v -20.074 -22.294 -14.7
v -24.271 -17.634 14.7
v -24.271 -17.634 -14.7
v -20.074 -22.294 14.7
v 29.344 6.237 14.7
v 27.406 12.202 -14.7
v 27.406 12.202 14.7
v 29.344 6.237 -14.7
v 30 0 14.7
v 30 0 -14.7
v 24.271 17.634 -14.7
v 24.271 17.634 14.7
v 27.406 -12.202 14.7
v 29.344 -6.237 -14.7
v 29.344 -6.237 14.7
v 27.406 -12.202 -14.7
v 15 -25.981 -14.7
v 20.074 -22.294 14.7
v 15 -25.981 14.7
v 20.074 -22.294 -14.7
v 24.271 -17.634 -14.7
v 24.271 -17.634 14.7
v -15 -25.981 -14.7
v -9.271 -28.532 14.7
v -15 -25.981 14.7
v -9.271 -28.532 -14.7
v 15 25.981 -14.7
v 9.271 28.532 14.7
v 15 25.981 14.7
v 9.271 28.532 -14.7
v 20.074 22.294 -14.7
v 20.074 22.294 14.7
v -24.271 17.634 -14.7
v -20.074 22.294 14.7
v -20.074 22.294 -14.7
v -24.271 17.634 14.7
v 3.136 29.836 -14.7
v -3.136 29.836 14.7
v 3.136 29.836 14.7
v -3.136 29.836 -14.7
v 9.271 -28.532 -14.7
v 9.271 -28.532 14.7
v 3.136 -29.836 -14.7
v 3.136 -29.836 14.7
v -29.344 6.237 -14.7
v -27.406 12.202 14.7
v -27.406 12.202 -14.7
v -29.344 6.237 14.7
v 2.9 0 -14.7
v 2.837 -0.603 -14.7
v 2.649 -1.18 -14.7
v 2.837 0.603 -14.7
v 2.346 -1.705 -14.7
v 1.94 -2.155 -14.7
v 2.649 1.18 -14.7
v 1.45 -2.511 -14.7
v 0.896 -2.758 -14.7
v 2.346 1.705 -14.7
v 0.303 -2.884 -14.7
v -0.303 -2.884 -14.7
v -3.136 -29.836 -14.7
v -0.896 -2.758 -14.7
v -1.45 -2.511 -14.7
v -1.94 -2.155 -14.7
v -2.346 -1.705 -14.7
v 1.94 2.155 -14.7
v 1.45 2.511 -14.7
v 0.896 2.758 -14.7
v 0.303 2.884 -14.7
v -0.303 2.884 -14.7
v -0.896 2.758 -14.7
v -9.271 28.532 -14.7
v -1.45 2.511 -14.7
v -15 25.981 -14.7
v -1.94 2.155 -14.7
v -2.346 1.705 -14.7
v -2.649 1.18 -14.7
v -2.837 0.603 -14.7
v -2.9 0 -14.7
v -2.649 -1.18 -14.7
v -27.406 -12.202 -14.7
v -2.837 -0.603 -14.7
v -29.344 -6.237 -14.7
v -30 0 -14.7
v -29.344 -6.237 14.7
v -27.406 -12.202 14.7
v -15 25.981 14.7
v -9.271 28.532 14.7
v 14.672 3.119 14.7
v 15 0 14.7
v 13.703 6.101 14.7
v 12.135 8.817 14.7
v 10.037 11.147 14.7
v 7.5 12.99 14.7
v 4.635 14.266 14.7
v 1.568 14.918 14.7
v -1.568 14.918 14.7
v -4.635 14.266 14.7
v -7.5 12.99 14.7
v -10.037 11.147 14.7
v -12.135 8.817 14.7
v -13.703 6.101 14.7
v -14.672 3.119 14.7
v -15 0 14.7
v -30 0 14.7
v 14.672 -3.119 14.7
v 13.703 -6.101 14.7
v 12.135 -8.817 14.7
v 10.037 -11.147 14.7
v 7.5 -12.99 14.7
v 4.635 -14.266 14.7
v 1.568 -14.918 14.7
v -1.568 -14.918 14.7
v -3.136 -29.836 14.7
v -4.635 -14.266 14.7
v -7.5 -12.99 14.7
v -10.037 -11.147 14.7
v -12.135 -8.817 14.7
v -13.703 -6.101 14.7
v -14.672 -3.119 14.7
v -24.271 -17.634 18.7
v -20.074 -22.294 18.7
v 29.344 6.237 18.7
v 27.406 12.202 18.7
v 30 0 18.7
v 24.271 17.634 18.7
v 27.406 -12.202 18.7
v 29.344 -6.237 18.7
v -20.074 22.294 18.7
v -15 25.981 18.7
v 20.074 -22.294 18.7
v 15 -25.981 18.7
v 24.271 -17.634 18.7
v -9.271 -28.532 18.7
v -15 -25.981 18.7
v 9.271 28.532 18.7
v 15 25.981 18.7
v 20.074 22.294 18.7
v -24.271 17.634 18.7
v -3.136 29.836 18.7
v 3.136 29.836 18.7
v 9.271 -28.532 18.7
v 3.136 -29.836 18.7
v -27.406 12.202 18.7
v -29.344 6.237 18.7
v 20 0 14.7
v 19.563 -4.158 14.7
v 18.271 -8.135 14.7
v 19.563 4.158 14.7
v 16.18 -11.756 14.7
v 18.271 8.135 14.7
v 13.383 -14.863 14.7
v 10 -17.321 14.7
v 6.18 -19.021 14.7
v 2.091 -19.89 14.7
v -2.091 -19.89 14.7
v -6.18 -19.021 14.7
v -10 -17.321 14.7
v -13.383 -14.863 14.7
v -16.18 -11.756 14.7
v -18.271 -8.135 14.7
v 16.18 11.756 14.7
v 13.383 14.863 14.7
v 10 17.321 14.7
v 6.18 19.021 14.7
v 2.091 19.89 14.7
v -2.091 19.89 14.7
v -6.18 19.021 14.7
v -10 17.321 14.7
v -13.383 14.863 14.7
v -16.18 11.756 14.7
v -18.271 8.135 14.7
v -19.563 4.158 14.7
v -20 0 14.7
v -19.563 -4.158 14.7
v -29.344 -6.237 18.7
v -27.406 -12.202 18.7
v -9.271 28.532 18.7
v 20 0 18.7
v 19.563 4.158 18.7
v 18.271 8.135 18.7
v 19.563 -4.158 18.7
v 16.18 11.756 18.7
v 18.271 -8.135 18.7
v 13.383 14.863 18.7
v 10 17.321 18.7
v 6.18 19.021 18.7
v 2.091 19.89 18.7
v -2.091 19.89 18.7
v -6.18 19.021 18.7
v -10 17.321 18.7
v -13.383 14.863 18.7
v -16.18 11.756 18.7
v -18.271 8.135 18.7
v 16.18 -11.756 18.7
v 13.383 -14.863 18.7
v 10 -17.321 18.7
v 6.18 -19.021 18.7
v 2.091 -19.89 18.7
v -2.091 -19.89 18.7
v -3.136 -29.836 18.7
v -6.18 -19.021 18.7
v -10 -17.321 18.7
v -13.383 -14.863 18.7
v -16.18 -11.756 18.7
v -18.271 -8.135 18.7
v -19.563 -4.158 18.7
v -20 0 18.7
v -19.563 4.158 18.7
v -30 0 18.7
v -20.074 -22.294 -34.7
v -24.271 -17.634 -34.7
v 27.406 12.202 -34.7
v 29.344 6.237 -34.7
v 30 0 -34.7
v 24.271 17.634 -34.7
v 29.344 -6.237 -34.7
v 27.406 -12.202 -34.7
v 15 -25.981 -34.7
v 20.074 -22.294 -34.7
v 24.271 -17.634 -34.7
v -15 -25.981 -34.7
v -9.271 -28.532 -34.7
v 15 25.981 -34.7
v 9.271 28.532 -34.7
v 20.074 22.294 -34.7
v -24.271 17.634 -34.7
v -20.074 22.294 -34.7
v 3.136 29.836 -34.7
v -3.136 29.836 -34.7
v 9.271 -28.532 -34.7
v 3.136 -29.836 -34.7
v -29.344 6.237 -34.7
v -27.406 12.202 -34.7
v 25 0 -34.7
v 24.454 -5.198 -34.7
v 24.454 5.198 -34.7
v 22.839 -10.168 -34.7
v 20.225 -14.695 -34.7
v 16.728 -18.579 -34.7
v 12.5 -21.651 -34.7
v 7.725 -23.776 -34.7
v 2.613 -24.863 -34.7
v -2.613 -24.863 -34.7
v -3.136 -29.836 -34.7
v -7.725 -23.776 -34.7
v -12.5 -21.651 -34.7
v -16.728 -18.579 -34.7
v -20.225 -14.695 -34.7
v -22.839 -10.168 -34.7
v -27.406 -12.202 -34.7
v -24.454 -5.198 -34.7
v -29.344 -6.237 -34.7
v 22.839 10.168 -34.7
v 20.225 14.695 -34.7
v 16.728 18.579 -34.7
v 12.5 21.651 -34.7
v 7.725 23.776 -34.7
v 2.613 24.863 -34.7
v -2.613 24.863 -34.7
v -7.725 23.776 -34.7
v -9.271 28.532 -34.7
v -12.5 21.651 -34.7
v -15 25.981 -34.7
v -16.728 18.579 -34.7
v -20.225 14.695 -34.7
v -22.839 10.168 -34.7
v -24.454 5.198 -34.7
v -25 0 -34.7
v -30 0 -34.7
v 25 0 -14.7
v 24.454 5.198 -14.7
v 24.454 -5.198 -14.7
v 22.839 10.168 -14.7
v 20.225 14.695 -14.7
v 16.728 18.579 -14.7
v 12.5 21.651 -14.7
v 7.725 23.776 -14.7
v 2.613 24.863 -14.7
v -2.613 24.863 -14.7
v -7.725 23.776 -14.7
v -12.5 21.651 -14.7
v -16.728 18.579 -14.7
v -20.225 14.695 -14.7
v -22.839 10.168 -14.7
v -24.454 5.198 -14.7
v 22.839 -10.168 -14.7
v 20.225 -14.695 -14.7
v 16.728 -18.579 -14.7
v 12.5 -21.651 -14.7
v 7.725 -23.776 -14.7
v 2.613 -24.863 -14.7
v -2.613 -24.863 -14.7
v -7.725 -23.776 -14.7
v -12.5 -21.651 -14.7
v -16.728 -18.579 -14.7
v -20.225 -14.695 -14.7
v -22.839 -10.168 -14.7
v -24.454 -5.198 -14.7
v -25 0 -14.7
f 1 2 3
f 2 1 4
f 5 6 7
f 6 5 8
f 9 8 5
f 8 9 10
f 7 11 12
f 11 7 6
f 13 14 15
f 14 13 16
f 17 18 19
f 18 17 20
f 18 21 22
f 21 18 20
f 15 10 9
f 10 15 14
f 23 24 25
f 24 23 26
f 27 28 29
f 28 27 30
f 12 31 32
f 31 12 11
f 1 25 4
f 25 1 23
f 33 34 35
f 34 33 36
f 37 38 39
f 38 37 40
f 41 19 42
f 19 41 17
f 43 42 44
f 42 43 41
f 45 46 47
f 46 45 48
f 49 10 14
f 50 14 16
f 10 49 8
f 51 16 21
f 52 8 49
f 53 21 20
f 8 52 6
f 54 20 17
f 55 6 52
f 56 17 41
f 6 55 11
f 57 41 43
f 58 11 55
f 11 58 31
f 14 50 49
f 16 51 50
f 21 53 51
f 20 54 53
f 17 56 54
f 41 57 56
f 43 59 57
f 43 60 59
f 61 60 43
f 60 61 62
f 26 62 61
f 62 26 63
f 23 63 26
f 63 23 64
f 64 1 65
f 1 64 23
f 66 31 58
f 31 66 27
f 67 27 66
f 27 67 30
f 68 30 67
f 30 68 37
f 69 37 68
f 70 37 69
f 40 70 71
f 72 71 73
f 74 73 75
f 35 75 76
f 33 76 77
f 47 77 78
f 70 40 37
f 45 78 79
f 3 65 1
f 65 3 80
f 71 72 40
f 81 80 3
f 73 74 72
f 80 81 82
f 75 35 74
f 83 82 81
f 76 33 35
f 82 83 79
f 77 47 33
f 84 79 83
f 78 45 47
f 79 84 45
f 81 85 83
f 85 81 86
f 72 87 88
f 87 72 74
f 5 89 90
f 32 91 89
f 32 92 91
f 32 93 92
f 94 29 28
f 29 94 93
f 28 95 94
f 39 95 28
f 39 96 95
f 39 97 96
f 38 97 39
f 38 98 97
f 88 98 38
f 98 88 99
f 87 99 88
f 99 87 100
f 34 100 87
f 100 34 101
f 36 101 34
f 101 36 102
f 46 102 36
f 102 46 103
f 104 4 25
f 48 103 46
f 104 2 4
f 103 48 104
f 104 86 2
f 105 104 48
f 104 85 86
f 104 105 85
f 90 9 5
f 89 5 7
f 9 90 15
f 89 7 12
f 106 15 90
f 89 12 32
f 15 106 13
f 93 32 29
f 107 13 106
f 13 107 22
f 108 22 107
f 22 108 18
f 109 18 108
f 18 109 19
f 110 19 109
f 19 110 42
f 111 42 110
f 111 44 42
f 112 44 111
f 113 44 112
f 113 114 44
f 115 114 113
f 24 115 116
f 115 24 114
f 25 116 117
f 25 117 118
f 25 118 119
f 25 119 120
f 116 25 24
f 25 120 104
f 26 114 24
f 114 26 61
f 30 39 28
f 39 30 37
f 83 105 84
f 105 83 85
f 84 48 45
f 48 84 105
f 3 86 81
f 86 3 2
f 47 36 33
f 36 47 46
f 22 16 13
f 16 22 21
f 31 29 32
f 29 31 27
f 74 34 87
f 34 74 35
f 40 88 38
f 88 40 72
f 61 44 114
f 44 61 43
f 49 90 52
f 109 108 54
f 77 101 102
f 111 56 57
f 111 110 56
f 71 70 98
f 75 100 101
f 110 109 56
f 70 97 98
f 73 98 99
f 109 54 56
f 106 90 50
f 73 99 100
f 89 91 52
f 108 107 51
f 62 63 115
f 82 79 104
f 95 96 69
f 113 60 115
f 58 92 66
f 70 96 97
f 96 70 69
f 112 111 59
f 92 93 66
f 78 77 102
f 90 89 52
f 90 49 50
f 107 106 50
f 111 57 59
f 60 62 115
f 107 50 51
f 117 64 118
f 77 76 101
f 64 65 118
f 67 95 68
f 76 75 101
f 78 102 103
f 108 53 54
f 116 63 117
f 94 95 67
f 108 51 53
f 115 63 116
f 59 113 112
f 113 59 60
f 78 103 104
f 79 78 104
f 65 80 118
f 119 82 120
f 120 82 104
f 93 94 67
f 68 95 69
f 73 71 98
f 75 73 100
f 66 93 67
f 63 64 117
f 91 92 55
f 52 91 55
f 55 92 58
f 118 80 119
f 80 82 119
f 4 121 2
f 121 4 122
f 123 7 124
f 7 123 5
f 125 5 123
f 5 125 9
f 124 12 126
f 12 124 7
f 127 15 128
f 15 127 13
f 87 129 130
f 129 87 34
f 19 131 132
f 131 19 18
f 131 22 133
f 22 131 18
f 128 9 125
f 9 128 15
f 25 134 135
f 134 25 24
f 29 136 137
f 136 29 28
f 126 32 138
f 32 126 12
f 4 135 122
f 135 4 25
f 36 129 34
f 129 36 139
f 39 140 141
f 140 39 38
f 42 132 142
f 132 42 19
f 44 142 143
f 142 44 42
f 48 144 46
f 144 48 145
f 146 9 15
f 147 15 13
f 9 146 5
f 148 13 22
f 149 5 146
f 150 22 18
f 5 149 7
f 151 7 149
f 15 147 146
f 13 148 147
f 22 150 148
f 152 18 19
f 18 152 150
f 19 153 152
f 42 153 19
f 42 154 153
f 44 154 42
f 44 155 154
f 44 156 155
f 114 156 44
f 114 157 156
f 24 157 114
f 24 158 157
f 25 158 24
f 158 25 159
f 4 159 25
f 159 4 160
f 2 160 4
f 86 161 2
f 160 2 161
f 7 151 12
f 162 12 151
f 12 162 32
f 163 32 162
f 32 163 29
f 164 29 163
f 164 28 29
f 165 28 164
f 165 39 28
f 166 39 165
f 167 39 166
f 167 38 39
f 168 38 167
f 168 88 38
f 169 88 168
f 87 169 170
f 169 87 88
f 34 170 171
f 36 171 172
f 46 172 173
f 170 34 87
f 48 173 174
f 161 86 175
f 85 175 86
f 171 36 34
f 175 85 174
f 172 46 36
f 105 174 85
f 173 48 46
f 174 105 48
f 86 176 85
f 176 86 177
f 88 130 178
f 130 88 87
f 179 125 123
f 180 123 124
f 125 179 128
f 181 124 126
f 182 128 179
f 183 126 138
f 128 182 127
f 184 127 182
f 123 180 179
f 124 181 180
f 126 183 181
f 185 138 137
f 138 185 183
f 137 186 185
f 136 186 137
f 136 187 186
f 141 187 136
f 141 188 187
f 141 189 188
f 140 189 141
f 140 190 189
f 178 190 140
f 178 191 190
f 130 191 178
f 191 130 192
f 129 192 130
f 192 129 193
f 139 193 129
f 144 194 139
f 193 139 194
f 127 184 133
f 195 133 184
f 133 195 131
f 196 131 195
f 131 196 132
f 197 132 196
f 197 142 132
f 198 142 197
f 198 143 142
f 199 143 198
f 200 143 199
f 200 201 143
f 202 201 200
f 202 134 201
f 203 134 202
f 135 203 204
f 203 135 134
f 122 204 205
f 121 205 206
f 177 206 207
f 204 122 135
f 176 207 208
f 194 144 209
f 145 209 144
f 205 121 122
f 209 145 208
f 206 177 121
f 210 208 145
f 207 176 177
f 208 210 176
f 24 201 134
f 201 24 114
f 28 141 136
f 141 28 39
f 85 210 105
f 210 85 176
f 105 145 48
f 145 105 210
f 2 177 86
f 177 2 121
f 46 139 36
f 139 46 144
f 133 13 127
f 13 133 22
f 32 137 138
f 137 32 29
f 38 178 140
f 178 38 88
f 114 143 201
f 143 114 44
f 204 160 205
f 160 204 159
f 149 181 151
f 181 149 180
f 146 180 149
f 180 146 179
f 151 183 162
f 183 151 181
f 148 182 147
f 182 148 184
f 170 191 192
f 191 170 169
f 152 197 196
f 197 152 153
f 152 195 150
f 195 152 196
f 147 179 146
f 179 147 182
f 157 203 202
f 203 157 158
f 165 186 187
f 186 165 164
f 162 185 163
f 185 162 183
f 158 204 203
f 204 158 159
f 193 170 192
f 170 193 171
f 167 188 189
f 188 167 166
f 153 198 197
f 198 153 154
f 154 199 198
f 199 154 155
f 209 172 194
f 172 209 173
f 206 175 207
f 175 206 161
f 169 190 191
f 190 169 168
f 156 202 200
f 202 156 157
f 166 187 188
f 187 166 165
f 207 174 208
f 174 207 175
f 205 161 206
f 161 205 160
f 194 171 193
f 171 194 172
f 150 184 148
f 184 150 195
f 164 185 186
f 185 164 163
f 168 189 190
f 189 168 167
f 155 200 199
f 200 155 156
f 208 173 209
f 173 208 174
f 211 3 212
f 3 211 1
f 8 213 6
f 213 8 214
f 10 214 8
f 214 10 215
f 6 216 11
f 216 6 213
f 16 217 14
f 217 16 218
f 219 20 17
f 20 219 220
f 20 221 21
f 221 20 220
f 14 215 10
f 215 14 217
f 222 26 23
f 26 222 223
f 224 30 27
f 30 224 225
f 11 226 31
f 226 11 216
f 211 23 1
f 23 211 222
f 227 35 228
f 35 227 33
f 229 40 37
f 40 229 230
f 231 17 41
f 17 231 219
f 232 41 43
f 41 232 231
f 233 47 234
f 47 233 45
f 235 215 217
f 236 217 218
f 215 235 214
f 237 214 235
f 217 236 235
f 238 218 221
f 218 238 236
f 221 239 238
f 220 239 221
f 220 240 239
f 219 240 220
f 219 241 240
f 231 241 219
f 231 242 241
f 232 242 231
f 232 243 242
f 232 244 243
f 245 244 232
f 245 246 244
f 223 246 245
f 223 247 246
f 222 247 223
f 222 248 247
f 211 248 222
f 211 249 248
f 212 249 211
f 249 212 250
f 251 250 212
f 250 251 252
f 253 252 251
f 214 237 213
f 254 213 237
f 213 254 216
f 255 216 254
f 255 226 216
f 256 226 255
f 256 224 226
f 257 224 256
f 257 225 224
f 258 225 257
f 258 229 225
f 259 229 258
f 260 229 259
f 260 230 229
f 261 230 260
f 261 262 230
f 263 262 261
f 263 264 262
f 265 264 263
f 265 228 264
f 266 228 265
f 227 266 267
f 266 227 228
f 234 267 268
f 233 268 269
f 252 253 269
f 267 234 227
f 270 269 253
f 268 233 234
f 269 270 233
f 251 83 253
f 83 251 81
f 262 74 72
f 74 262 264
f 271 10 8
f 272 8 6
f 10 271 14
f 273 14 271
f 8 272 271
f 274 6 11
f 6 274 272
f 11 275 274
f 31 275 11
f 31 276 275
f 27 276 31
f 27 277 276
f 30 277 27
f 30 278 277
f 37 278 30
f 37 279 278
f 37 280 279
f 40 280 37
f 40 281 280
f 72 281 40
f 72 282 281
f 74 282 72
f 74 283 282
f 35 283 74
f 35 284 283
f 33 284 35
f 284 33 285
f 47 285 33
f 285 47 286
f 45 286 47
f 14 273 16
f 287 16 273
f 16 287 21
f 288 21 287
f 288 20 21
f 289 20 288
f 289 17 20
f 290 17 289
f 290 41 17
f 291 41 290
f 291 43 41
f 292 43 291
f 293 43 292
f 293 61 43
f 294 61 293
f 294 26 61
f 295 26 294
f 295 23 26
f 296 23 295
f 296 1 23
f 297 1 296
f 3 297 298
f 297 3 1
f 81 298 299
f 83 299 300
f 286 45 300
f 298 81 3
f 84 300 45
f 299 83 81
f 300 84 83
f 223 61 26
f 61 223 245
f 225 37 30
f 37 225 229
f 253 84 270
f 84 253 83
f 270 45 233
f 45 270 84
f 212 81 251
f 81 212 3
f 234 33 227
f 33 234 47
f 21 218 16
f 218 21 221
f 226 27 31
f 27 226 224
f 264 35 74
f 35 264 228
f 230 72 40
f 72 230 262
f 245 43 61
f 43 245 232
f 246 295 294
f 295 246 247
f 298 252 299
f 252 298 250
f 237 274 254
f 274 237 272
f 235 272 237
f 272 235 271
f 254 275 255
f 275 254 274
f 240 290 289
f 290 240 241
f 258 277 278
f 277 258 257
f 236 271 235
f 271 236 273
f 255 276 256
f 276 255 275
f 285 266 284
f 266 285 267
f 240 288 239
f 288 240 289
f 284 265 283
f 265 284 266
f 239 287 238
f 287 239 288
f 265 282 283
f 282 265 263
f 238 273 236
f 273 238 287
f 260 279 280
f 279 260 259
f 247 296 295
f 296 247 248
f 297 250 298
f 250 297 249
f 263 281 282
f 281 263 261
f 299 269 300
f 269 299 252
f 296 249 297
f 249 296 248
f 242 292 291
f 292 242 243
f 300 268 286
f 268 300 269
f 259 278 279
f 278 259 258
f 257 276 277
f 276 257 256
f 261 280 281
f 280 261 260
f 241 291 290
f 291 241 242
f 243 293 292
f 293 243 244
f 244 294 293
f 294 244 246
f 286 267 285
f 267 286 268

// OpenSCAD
//The lense diameter in mm, not HALF
lensediameter = 30;
//The led diameter in mm, not HALF
leddiameter = 5.8;
//The focus in mm
focus = 25;
//The tubediameter in mm
tubediameter = 30;
//The lense height
lenseheight = 4;
//Edge to bet generated AROUND the lense, because sometimes you have to adjust the lense.
lenseedge = 5;
//This is the amount of mm increased to the focus, because the led do not emit light at Z=0, the TSAL6100 in this case @ 4.4mm, please look in the datasheet of the TSAL6100 emitter to know what i mean
ledmmstartradiation = 4.4; //4.4 if you use a TSAL6100

//Make extrapipe* ZERO do deactivate it. This adds a extra pipe to the main cylinder.
extrapipe = 20;
extrapipe_innerdiameter = 5;



height = focus + ledmmstartradiation;


difference() {

cylinder(h = height, r1 = tubediameter , r2 = tubediameter, center=true);
    cylinder(h = height, r1 = leddiameter / 2, r2 = lensediameter / 2, center=true);
}

translate([0,0,height / 2 + lenseheight / 2]) {
difference() {

cylinder(h = lenseheight , r1 = tubediameter , r2 = tubediameter, center=true);
    cylinder(h = lenseheight, r1 = lensediameter / 2 + lenseedge, r2 = lensediameter / 2 + lenseedge , center=true);
}
}

//Calculate a extra tube
translate([0,0,-(height / 2) - extrapipe / 2]) {
difference() {

cylinder(h = extrapipe , r1 = tubediameter , r2 = tubediameter, center=true);
    cylinder(h = extrapipe, r1 =  tubediameter - extrapipe_innerdiameter, r2 = tubediameter - extrapipe_innerdiameter , center=true);
}
}

